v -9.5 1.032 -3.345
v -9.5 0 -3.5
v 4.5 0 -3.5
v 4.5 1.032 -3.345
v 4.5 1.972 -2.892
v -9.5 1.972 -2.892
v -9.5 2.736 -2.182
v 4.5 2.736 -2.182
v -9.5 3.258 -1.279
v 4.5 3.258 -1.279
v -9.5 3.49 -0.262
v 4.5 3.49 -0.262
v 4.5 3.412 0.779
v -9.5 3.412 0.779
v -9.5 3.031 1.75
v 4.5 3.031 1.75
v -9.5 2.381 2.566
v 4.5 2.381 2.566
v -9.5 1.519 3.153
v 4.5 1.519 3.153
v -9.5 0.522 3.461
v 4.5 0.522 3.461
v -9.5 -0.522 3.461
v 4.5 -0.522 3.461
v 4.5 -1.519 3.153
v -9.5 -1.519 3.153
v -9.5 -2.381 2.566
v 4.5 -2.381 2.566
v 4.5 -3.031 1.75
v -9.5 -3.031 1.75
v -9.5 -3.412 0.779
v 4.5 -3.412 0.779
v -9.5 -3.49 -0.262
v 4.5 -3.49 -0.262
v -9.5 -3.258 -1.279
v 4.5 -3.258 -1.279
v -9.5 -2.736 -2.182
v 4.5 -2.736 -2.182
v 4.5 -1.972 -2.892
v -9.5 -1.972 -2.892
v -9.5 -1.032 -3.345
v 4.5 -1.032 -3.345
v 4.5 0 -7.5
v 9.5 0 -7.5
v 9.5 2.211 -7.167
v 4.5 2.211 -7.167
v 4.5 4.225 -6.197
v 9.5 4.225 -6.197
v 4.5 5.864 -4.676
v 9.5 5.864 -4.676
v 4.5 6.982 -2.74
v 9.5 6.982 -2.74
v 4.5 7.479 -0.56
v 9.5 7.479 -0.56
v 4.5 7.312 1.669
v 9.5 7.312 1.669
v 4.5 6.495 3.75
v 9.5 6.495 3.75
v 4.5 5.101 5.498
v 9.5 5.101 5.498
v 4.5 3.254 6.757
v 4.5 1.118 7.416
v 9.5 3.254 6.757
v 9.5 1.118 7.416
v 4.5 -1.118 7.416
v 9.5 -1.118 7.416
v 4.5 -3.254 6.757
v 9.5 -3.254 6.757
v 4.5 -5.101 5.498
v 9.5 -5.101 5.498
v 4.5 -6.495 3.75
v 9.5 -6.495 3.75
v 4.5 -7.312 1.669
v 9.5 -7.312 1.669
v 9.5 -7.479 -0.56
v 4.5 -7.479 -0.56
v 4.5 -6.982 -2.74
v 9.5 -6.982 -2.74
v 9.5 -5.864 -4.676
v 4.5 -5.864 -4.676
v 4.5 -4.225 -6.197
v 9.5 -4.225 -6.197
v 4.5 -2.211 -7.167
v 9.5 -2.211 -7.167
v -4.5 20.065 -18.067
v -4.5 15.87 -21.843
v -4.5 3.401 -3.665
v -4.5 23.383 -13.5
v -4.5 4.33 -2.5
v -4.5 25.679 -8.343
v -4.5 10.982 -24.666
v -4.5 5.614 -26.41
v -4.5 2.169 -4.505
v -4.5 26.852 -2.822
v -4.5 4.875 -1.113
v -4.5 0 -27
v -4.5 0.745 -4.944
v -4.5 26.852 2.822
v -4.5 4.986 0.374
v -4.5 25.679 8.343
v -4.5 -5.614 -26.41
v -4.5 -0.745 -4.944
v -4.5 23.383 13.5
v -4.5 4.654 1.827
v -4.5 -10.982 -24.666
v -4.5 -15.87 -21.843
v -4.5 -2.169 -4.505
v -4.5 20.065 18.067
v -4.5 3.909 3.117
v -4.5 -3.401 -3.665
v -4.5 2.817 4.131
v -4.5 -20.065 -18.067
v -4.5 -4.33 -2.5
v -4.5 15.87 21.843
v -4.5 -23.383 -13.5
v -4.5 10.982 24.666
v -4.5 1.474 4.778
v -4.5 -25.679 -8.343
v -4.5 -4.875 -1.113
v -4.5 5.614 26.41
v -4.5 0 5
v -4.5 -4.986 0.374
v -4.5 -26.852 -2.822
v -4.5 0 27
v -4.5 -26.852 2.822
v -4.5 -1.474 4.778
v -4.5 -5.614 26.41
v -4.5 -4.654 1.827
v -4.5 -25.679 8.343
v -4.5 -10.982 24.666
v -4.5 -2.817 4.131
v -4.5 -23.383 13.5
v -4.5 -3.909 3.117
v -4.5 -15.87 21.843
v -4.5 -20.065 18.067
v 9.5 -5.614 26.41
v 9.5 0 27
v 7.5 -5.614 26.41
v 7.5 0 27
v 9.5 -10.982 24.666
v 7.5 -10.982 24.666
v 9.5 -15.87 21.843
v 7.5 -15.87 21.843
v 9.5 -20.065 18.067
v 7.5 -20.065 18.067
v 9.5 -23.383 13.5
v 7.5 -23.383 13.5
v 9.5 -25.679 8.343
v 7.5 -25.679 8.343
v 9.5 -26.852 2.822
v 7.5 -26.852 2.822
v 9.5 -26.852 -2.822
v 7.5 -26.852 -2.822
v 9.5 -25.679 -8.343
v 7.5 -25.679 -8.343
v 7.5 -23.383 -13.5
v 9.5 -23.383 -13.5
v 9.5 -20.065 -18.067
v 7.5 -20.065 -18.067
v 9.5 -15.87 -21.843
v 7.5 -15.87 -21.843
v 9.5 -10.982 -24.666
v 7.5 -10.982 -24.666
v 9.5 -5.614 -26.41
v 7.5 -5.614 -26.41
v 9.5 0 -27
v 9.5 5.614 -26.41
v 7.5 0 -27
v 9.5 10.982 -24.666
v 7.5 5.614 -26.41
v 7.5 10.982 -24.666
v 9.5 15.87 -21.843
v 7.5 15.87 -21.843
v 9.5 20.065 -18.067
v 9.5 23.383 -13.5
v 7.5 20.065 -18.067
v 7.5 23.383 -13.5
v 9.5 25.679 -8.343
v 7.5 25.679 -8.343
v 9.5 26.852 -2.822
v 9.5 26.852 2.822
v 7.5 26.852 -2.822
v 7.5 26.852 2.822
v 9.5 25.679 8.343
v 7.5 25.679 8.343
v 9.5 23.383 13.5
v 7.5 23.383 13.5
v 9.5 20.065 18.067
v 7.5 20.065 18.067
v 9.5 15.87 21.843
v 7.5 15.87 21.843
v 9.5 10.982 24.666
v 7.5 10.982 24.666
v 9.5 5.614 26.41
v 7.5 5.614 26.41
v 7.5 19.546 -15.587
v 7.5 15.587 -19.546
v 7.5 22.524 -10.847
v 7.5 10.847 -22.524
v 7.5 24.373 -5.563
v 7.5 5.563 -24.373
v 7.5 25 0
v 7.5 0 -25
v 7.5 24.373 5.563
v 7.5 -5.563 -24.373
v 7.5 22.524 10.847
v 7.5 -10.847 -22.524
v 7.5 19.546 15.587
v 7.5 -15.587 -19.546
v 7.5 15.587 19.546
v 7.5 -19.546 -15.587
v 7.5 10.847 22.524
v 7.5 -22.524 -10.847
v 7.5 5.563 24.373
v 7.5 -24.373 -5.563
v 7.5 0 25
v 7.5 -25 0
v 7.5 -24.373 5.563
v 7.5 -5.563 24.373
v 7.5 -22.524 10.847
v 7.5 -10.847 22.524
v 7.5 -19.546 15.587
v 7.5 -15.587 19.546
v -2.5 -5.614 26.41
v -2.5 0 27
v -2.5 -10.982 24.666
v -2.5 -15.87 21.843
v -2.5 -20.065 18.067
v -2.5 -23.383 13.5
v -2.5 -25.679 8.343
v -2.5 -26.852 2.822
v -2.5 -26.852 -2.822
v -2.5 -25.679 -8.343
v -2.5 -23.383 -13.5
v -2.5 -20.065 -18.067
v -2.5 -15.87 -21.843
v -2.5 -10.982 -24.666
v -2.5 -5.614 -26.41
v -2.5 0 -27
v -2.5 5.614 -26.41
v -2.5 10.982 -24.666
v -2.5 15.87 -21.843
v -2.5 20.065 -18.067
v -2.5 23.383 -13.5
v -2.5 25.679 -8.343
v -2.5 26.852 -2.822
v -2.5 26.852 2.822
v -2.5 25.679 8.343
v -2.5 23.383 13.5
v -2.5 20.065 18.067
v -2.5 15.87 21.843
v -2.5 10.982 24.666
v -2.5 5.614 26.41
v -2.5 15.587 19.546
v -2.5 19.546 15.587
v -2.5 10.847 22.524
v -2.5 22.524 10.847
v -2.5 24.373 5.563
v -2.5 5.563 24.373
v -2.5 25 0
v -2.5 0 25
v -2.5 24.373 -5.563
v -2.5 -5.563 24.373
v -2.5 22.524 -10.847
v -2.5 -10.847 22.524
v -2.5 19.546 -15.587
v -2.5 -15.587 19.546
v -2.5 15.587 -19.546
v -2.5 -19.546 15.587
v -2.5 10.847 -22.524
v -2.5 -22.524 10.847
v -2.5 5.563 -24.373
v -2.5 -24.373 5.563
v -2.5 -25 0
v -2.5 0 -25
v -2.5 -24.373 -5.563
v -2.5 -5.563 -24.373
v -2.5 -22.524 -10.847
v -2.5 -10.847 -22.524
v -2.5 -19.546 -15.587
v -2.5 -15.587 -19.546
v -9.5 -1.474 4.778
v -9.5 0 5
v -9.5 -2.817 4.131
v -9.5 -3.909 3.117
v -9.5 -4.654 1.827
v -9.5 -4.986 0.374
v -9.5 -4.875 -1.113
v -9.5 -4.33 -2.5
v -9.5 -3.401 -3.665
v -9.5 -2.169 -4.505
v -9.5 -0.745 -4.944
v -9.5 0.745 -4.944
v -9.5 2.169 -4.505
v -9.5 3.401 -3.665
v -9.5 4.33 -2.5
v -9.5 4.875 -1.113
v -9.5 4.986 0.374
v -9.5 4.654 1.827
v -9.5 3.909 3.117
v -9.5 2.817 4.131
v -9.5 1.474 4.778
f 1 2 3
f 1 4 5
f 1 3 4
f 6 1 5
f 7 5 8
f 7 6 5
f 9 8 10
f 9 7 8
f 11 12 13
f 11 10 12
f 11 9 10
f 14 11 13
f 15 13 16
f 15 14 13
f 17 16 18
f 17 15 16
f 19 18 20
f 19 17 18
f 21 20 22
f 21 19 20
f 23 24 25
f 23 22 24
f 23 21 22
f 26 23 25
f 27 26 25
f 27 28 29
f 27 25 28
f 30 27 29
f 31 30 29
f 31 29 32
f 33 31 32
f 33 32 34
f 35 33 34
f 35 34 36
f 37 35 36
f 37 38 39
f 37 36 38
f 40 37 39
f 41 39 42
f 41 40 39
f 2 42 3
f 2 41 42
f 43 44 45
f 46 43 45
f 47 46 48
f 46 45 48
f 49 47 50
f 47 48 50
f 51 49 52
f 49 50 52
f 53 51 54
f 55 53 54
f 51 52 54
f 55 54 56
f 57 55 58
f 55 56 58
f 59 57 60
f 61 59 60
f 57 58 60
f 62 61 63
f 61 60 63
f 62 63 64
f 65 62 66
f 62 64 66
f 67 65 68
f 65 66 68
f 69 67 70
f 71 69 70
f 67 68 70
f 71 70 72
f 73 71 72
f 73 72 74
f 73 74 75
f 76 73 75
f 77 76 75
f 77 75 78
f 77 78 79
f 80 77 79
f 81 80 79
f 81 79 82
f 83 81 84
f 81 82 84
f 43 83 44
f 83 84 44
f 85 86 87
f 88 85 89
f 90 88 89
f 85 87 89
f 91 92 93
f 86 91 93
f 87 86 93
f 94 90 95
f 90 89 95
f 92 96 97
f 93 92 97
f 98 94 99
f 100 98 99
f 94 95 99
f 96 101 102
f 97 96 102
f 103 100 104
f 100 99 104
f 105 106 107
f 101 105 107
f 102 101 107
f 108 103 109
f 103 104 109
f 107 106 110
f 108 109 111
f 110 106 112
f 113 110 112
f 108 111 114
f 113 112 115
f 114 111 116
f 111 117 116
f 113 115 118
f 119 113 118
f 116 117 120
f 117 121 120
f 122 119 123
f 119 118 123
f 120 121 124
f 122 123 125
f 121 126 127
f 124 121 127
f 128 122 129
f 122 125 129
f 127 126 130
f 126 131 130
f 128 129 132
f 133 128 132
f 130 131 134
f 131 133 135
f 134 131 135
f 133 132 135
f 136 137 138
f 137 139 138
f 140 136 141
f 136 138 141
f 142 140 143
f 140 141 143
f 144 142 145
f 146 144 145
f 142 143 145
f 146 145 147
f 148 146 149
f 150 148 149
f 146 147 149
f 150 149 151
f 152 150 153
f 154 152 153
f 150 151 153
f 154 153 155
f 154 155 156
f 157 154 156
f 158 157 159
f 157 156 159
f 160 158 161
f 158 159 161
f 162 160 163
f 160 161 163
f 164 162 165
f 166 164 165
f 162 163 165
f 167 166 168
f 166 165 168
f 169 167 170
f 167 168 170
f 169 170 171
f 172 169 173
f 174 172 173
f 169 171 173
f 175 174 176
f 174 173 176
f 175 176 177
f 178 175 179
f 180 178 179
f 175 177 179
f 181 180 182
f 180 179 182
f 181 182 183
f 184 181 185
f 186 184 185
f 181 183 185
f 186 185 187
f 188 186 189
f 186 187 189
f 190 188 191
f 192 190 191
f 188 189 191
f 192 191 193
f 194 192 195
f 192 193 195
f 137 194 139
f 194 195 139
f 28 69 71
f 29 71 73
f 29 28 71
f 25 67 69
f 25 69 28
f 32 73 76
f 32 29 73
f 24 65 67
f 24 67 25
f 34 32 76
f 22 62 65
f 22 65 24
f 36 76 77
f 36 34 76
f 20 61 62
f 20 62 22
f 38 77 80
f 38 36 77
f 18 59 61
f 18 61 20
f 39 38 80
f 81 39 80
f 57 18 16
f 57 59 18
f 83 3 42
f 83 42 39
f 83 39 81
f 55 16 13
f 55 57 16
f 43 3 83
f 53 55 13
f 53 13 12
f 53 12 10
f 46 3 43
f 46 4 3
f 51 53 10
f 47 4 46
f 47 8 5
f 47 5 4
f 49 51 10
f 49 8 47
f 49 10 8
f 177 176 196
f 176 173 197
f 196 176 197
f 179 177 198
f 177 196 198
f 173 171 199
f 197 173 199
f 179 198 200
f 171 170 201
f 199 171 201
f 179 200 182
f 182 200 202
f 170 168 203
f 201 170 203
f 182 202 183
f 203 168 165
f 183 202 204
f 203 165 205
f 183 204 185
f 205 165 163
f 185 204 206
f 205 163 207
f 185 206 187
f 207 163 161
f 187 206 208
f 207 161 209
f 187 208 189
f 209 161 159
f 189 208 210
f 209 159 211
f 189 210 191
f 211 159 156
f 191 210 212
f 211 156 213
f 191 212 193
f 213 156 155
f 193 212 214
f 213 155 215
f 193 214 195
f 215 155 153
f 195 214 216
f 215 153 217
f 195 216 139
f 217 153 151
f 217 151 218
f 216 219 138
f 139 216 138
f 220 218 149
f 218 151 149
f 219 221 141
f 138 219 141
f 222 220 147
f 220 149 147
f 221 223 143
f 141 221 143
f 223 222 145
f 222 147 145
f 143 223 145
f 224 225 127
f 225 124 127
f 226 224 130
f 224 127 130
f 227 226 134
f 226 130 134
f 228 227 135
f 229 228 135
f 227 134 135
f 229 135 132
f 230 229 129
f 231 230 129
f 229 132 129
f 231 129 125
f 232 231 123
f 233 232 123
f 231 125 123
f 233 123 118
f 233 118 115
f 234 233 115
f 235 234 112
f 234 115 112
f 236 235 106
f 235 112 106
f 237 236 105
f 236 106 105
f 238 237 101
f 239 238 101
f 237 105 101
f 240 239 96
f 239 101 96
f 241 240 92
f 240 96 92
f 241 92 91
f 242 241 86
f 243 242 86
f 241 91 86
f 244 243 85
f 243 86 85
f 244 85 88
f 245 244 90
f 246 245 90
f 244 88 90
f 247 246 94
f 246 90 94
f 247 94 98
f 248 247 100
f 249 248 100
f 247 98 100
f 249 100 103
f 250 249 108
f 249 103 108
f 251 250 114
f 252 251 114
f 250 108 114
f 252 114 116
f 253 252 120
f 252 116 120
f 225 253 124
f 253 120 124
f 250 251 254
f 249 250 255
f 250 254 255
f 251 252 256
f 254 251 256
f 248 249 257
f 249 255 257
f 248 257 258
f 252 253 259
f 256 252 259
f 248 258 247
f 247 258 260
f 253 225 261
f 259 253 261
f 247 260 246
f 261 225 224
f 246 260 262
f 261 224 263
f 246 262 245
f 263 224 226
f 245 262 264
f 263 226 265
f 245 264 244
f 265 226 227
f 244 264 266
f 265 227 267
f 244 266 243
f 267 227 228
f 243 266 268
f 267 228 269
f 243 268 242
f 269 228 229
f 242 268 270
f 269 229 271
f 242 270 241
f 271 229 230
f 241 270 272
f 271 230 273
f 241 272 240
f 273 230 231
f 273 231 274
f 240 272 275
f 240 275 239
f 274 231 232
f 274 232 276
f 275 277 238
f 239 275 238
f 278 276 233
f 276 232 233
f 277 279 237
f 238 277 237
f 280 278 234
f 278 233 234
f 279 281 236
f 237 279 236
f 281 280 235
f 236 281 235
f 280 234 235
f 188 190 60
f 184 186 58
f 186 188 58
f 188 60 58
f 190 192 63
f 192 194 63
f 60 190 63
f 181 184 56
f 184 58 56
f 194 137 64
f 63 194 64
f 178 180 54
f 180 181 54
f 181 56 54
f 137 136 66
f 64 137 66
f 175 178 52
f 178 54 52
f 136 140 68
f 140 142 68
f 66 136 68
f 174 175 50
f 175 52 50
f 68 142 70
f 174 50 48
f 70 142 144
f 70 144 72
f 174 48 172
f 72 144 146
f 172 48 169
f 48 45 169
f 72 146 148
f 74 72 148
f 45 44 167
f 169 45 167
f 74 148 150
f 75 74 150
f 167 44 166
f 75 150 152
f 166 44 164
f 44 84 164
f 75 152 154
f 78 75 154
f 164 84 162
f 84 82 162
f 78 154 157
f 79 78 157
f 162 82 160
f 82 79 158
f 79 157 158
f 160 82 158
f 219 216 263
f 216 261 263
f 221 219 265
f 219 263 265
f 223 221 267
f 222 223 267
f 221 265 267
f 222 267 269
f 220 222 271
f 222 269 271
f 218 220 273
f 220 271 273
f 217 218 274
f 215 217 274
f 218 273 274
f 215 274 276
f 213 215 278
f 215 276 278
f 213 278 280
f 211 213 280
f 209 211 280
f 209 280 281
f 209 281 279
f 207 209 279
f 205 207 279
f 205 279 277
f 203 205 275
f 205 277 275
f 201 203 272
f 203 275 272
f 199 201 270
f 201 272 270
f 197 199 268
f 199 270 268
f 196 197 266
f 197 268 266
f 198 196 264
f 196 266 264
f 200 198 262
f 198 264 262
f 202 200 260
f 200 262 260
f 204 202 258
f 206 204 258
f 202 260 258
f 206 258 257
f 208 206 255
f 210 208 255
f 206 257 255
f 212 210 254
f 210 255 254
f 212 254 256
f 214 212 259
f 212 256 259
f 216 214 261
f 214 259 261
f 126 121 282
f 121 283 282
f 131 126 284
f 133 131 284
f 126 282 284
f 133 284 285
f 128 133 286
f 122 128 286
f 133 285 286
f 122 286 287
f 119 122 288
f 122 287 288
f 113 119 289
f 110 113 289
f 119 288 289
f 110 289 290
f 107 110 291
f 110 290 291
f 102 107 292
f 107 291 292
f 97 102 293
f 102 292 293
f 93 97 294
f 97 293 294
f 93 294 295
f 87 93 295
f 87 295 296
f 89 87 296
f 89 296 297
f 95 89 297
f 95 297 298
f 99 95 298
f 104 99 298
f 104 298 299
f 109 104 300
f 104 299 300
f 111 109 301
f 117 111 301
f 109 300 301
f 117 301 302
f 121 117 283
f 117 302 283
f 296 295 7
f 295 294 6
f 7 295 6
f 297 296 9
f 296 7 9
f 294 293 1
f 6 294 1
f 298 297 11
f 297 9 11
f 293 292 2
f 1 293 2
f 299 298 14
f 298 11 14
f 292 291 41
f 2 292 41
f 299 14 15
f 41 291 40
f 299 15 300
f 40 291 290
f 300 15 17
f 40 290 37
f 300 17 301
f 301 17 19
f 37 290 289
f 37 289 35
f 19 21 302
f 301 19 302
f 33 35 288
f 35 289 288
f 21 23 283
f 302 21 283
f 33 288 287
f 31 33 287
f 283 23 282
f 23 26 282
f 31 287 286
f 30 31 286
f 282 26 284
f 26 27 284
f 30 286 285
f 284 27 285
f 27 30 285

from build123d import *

# Parameters (mm, degrees)
CUT_EXTRUDE1_DEPTH      = 40.347808071
CUT_EXTRUDE1_DEPTH_BACK = 40.347808071
SKETCH2_R               = 3.5
SKETCH3_R               = 7.5
CUT_EXTRUDE2_DEPTH      = 5


with BuildPart() as part:
    # Sketch1 → Revolve1 (revolve)
    with BuildSketch(Plane.XY, mode=Mode.PRIVATE) as revolve1_sk:
        Polygon((-9.5, 0), (9.5, 0), (9.5, 27), (7.5, 27), (7.5, 25), (-2.5, 25), (-2.5, 27), (-4.5, 27), (-4.5, 5), (-9.5, 5), align=None)
    revolve(revolve1_sk.sketch.rotate(Axis((-9.5, 0, 0), (1, 0, 0)), 90), axis=Axis((-9.5, 0, 0), (1, 0, 0)))

    # Sketch2 → Cut-Extrude1 (cut, two sides: drawn at the far end of the back side and taken through both)
    with BuildSketch(Plane(origin=(0, 0, 0), x_dir=(0, 0, -1), z_dir=(1, 0, 0)).offset(-CUT_EXTRUDE1_DEPTH_BACK)):
        Circle(SKETCH2_R)
    extrude(amount=CUT_EXTRUDE1_DEPTH + CUT_EXTRUDE1_DEPTH_BACK, mode=Mode.SUBTRACT)

    # Sketch3 → Cut-Extrude2 (cut)
    with BuildSketch(Plane(origin=(9.5, 0, 0), x_dir=(0, 0, -1), z_dir=(1, 0, 0))):
        Circle(SKETCH3_R)
    extrude(amount=-CUT_EXTRUDE2_DEPTH, mode=Mode.SUBTRACT)


solid = part.part
